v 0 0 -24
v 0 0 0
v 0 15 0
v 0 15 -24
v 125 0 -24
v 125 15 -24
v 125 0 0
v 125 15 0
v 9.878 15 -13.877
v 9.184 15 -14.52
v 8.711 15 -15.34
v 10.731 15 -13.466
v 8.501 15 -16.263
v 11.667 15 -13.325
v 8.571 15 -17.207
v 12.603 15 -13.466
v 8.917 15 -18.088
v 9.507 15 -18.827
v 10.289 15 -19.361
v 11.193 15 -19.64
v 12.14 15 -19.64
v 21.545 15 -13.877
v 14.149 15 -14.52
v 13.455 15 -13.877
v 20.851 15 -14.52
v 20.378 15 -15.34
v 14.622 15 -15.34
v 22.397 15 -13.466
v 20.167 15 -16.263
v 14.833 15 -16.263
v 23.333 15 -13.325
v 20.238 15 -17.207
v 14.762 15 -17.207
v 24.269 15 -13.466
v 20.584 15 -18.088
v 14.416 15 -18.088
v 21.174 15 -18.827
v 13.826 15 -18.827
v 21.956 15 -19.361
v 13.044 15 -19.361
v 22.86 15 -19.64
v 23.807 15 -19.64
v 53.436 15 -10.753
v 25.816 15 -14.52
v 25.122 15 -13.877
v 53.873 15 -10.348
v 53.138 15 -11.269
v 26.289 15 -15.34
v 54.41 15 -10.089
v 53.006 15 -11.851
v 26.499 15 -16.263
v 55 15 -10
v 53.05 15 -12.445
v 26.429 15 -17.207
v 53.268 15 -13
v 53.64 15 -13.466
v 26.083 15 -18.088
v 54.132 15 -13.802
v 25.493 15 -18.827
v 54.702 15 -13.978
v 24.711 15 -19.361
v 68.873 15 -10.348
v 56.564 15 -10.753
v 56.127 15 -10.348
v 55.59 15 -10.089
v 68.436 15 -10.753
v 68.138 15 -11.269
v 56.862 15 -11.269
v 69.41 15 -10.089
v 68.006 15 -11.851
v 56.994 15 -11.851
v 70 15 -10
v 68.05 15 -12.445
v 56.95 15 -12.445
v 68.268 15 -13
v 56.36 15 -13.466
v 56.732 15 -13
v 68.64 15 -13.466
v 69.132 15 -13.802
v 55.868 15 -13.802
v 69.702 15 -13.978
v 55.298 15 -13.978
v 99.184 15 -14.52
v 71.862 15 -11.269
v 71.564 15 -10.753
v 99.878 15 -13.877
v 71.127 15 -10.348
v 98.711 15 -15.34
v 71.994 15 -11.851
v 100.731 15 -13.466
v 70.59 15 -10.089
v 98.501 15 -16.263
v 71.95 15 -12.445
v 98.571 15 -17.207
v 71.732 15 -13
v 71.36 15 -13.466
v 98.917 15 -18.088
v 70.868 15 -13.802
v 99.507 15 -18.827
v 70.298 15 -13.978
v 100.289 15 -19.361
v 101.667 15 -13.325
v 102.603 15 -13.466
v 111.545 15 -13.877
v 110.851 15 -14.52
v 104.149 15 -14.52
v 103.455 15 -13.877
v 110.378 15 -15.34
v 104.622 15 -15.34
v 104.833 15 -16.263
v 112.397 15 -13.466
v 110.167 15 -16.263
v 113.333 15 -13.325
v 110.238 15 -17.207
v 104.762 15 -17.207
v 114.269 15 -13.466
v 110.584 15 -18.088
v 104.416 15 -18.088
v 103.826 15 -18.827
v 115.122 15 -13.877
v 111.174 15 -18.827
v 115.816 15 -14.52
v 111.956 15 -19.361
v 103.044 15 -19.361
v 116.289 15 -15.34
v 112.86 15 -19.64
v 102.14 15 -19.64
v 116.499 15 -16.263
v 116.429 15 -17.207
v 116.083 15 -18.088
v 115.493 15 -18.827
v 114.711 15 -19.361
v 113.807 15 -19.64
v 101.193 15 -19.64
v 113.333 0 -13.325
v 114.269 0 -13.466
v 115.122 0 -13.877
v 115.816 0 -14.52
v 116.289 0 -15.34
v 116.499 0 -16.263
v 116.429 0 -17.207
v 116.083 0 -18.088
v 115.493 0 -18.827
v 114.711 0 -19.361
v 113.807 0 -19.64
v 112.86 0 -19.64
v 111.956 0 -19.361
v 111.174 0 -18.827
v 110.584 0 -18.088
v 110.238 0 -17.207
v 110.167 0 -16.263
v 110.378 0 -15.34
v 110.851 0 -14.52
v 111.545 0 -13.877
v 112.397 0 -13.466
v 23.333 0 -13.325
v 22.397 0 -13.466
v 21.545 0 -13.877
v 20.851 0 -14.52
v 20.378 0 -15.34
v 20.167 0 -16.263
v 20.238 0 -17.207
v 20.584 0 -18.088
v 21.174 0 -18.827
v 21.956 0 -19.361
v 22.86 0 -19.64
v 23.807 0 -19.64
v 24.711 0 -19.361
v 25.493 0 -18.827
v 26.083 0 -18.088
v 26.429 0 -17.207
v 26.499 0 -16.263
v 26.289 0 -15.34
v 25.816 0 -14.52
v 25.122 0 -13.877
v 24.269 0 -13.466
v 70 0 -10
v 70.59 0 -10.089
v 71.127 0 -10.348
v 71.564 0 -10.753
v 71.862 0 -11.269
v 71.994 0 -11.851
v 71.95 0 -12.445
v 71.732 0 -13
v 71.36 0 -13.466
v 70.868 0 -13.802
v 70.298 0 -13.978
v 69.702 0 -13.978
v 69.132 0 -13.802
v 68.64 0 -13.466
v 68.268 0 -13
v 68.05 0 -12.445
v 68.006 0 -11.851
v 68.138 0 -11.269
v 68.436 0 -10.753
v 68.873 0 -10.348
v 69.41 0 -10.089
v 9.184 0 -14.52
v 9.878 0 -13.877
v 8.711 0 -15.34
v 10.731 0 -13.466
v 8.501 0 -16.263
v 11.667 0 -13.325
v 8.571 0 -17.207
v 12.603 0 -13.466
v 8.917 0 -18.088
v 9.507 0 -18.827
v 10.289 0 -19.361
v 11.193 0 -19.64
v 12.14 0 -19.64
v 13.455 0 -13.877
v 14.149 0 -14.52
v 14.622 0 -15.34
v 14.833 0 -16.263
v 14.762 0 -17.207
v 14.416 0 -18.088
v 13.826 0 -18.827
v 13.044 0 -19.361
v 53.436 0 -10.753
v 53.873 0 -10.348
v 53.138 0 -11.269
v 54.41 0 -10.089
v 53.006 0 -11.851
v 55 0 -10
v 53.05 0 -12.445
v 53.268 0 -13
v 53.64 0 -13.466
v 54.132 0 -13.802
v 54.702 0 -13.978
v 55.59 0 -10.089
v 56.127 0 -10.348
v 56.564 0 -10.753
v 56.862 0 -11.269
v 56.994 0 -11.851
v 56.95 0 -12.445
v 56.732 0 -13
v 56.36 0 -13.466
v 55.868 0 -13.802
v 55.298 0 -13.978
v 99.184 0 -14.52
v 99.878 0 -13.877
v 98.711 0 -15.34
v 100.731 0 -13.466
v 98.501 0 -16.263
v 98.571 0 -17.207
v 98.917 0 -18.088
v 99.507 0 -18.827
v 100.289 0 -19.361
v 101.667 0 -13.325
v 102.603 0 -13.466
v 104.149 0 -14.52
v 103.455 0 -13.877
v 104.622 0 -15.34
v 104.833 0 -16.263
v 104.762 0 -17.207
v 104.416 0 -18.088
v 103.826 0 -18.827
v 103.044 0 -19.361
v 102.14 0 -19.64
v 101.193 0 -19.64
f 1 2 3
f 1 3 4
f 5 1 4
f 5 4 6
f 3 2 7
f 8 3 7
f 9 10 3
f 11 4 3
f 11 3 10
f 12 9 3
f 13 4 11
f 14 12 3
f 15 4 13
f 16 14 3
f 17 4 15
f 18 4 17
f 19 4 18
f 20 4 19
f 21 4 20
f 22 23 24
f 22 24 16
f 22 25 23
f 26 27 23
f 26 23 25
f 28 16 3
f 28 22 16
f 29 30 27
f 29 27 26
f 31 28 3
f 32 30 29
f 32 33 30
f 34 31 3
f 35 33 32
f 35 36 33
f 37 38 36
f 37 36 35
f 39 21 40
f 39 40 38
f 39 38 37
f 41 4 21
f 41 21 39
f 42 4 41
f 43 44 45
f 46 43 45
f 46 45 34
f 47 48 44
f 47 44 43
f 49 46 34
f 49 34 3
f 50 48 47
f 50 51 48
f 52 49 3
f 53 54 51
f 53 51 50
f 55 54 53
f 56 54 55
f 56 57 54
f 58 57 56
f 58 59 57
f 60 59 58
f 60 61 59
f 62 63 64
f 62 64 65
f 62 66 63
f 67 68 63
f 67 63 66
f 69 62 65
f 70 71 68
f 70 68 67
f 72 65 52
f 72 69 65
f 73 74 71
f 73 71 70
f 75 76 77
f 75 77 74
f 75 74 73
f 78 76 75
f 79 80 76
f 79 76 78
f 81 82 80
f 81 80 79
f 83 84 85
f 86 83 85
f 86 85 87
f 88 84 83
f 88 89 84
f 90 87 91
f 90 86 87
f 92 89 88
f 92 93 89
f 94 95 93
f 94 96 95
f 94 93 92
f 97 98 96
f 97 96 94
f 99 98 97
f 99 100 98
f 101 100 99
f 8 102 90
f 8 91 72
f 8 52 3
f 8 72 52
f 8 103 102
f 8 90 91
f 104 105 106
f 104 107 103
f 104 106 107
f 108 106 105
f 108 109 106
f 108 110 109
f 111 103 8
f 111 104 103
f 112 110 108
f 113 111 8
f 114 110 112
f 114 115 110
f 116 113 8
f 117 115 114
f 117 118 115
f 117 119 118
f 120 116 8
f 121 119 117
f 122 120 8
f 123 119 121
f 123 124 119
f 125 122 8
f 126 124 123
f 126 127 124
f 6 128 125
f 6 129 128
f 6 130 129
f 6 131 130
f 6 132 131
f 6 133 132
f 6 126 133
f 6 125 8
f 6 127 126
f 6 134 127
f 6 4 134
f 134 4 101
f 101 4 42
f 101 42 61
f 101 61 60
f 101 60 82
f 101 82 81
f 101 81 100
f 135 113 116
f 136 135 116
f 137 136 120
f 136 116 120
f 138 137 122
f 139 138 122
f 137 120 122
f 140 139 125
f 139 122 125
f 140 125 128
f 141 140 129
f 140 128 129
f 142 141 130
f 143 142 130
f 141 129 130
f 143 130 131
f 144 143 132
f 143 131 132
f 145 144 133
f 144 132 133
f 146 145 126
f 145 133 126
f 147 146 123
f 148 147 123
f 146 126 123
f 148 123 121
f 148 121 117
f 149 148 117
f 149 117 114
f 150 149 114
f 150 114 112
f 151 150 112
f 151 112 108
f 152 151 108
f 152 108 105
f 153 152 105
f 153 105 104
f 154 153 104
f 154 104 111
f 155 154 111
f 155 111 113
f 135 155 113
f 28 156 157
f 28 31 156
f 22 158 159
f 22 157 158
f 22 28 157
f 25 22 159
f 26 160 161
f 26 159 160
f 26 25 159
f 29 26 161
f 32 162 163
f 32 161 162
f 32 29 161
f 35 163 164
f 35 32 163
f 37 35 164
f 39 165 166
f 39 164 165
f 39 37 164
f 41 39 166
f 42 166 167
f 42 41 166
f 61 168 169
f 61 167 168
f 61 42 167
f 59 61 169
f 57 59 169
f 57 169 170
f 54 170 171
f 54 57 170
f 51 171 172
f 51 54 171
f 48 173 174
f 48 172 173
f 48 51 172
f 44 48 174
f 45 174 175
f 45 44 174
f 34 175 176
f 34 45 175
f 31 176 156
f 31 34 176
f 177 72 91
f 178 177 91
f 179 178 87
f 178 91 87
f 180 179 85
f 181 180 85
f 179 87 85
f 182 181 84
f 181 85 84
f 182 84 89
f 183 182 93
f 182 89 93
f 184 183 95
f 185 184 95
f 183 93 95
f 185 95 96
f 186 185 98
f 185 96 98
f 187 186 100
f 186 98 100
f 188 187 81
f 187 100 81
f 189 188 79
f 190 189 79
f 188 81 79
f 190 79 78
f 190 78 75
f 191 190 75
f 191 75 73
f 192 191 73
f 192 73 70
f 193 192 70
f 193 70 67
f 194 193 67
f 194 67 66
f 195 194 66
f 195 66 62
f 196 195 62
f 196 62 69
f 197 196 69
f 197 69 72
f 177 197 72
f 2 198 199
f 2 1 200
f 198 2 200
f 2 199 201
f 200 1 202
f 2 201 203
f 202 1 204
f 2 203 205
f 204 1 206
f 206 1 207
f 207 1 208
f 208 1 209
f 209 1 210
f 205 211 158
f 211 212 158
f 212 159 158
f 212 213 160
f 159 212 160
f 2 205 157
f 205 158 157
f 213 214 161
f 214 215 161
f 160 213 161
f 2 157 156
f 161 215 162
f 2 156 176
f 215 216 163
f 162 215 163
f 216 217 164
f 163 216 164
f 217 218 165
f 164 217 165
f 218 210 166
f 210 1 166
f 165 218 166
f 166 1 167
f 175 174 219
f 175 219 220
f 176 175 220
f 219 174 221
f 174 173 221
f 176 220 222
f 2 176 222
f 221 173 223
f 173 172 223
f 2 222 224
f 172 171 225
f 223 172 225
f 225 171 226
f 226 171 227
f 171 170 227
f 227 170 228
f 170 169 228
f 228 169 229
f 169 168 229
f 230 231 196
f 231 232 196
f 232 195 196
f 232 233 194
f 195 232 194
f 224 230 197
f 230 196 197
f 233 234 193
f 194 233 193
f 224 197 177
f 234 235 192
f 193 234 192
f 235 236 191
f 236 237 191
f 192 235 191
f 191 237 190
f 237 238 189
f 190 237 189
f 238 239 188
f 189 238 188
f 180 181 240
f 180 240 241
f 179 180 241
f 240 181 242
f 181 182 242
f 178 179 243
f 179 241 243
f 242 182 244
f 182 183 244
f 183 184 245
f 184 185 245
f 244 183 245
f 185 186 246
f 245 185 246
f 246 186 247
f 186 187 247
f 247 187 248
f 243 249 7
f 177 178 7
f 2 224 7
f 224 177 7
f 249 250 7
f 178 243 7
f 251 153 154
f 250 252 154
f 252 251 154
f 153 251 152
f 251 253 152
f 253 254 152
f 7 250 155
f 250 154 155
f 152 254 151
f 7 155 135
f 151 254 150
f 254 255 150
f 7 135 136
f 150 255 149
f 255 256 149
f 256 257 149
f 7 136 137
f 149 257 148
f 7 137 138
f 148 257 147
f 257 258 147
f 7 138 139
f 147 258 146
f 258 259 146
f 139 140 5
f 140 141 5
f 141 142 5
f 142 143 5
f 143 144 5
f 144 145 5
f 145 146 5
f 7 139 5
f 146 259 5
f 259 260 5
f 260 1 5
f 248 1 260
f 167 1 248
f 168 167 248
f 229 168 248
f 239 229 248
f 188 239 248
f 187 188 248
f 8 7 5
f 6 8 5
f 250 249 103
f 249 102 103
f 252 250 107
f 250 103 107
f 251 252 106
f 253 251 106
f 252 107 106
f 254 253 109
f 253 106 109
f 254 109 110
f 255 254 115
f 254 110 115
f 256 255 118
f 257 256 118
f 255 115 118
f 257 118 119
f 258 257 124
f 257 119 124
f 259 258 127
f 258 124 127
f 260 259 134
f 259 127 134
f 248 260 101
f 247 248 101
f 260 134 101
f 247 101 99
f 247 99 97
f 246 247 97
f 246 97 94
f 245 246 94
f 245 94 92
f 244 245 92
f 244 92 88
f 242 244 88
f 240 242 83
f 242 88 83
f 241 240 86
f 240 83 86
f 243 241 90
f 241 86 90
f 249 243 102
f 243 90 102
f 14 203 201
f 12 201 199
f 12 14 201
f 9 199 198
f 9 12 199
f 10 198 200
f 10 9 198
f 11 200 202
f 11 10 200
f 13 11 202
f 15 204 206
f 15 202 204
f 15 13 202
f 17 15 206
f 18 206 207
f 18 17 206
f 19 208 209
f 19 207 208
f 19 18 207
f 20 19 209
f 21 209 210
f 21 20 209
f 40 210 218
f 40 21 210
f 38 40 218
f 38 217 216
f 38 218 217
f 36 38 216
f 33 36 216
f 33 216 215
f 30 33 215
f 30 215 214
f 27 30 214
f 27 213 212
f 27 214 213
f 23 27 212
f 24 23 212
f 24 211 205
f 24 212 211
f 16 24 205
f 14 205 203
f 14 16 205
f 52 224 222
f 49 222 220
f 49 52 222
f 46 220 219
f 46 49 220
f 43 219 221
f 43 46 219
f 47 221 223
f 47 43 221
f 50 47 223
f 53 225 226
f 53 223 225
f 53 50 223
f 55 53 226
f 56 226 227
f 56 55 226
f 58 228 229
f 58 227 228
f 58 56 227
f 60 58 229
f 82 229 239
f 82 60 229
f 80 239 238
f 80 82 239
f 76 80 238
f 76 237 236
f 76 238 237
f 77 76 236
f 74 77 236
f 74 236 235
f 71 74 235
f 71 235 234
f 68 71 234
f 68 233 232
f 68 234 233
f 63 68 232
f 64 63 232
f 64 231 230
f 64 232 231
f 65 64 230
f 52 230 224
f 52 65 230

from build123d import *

# Parameters (mm, degrees)
SKETCH1_W           = 125
SKETCH1_H           = 24
BOSS_EXTRUDE1_DEPTH = 15
SKETCH2_R           = 3.175
CUT_EXTRUDE1_DEPTH  = 129.163957492
SKETCH5_R           = 2
CUT_EXTRUDE2_DEPTH  = 129.163957492


with BuildPart() as part:
    # Sketch1 → Boss-Extrude1 (new body)
    with BuildSketch(Plane(origin=(0, 0, 0), x_dir=(1, 0, 0), z_dir=(0, 1, 0))):
        with Locations((62.5, 12)):
            Rectangle(SKETCH1_W, SKETCH1_H)
    extrude(amount=BOSS_EXTRUDE1_DEPTH)

    # Sketch2 → Cut-Extrude1 (cut, symmetric)
    with BuildSketch(Plane(origin=(0, 15, 0), x_dir=(1, 0, 0), z_dir=(0, 1, 0))):
        with Locations(Location((113.333333333, 16.5, 0), (0, 0, 270))):
            Circle(SKETCH2_R)
        with Locations(Location((101.666666667, 16.5, 0), (0, 0, 270))):
            Circle(SKETCH2_R)
    cut_extrude1 = extrude(amount=CUT_EXTRUDE1_DEPTH, both=True, mode=Mode.SUBTRACT)

    # Mirror1: Cut-Extrude1 across plane
    add(cut_extrude1.mirror(Plane.ZY.offset(-62.5)), mode=Mode.SUBTRACT)

    # Sketch5 → Cut-Extrude2 (cut, through all)
    with BuildSketch(Plane(origin=(0, 15, 0), x_dir=(1, 0, 0), z_dir=(0, 1, 0))):
        with Locations(Location((70, 12, 0), (0, 0, 270))):
            Circle(SKETCH5_R)
    cut_extrude2 = extrude(amount=-CUT_EXTRUDE2_DEPTH, mode=Mode.SUBTRACT)

    # Mirror2: Cut-Extrude2 across plane
    add(cut_extrude2.mirror(Plane.ZY.offset(-62.5)), mode=Mode.SUBTRACT)


solid = part.part
